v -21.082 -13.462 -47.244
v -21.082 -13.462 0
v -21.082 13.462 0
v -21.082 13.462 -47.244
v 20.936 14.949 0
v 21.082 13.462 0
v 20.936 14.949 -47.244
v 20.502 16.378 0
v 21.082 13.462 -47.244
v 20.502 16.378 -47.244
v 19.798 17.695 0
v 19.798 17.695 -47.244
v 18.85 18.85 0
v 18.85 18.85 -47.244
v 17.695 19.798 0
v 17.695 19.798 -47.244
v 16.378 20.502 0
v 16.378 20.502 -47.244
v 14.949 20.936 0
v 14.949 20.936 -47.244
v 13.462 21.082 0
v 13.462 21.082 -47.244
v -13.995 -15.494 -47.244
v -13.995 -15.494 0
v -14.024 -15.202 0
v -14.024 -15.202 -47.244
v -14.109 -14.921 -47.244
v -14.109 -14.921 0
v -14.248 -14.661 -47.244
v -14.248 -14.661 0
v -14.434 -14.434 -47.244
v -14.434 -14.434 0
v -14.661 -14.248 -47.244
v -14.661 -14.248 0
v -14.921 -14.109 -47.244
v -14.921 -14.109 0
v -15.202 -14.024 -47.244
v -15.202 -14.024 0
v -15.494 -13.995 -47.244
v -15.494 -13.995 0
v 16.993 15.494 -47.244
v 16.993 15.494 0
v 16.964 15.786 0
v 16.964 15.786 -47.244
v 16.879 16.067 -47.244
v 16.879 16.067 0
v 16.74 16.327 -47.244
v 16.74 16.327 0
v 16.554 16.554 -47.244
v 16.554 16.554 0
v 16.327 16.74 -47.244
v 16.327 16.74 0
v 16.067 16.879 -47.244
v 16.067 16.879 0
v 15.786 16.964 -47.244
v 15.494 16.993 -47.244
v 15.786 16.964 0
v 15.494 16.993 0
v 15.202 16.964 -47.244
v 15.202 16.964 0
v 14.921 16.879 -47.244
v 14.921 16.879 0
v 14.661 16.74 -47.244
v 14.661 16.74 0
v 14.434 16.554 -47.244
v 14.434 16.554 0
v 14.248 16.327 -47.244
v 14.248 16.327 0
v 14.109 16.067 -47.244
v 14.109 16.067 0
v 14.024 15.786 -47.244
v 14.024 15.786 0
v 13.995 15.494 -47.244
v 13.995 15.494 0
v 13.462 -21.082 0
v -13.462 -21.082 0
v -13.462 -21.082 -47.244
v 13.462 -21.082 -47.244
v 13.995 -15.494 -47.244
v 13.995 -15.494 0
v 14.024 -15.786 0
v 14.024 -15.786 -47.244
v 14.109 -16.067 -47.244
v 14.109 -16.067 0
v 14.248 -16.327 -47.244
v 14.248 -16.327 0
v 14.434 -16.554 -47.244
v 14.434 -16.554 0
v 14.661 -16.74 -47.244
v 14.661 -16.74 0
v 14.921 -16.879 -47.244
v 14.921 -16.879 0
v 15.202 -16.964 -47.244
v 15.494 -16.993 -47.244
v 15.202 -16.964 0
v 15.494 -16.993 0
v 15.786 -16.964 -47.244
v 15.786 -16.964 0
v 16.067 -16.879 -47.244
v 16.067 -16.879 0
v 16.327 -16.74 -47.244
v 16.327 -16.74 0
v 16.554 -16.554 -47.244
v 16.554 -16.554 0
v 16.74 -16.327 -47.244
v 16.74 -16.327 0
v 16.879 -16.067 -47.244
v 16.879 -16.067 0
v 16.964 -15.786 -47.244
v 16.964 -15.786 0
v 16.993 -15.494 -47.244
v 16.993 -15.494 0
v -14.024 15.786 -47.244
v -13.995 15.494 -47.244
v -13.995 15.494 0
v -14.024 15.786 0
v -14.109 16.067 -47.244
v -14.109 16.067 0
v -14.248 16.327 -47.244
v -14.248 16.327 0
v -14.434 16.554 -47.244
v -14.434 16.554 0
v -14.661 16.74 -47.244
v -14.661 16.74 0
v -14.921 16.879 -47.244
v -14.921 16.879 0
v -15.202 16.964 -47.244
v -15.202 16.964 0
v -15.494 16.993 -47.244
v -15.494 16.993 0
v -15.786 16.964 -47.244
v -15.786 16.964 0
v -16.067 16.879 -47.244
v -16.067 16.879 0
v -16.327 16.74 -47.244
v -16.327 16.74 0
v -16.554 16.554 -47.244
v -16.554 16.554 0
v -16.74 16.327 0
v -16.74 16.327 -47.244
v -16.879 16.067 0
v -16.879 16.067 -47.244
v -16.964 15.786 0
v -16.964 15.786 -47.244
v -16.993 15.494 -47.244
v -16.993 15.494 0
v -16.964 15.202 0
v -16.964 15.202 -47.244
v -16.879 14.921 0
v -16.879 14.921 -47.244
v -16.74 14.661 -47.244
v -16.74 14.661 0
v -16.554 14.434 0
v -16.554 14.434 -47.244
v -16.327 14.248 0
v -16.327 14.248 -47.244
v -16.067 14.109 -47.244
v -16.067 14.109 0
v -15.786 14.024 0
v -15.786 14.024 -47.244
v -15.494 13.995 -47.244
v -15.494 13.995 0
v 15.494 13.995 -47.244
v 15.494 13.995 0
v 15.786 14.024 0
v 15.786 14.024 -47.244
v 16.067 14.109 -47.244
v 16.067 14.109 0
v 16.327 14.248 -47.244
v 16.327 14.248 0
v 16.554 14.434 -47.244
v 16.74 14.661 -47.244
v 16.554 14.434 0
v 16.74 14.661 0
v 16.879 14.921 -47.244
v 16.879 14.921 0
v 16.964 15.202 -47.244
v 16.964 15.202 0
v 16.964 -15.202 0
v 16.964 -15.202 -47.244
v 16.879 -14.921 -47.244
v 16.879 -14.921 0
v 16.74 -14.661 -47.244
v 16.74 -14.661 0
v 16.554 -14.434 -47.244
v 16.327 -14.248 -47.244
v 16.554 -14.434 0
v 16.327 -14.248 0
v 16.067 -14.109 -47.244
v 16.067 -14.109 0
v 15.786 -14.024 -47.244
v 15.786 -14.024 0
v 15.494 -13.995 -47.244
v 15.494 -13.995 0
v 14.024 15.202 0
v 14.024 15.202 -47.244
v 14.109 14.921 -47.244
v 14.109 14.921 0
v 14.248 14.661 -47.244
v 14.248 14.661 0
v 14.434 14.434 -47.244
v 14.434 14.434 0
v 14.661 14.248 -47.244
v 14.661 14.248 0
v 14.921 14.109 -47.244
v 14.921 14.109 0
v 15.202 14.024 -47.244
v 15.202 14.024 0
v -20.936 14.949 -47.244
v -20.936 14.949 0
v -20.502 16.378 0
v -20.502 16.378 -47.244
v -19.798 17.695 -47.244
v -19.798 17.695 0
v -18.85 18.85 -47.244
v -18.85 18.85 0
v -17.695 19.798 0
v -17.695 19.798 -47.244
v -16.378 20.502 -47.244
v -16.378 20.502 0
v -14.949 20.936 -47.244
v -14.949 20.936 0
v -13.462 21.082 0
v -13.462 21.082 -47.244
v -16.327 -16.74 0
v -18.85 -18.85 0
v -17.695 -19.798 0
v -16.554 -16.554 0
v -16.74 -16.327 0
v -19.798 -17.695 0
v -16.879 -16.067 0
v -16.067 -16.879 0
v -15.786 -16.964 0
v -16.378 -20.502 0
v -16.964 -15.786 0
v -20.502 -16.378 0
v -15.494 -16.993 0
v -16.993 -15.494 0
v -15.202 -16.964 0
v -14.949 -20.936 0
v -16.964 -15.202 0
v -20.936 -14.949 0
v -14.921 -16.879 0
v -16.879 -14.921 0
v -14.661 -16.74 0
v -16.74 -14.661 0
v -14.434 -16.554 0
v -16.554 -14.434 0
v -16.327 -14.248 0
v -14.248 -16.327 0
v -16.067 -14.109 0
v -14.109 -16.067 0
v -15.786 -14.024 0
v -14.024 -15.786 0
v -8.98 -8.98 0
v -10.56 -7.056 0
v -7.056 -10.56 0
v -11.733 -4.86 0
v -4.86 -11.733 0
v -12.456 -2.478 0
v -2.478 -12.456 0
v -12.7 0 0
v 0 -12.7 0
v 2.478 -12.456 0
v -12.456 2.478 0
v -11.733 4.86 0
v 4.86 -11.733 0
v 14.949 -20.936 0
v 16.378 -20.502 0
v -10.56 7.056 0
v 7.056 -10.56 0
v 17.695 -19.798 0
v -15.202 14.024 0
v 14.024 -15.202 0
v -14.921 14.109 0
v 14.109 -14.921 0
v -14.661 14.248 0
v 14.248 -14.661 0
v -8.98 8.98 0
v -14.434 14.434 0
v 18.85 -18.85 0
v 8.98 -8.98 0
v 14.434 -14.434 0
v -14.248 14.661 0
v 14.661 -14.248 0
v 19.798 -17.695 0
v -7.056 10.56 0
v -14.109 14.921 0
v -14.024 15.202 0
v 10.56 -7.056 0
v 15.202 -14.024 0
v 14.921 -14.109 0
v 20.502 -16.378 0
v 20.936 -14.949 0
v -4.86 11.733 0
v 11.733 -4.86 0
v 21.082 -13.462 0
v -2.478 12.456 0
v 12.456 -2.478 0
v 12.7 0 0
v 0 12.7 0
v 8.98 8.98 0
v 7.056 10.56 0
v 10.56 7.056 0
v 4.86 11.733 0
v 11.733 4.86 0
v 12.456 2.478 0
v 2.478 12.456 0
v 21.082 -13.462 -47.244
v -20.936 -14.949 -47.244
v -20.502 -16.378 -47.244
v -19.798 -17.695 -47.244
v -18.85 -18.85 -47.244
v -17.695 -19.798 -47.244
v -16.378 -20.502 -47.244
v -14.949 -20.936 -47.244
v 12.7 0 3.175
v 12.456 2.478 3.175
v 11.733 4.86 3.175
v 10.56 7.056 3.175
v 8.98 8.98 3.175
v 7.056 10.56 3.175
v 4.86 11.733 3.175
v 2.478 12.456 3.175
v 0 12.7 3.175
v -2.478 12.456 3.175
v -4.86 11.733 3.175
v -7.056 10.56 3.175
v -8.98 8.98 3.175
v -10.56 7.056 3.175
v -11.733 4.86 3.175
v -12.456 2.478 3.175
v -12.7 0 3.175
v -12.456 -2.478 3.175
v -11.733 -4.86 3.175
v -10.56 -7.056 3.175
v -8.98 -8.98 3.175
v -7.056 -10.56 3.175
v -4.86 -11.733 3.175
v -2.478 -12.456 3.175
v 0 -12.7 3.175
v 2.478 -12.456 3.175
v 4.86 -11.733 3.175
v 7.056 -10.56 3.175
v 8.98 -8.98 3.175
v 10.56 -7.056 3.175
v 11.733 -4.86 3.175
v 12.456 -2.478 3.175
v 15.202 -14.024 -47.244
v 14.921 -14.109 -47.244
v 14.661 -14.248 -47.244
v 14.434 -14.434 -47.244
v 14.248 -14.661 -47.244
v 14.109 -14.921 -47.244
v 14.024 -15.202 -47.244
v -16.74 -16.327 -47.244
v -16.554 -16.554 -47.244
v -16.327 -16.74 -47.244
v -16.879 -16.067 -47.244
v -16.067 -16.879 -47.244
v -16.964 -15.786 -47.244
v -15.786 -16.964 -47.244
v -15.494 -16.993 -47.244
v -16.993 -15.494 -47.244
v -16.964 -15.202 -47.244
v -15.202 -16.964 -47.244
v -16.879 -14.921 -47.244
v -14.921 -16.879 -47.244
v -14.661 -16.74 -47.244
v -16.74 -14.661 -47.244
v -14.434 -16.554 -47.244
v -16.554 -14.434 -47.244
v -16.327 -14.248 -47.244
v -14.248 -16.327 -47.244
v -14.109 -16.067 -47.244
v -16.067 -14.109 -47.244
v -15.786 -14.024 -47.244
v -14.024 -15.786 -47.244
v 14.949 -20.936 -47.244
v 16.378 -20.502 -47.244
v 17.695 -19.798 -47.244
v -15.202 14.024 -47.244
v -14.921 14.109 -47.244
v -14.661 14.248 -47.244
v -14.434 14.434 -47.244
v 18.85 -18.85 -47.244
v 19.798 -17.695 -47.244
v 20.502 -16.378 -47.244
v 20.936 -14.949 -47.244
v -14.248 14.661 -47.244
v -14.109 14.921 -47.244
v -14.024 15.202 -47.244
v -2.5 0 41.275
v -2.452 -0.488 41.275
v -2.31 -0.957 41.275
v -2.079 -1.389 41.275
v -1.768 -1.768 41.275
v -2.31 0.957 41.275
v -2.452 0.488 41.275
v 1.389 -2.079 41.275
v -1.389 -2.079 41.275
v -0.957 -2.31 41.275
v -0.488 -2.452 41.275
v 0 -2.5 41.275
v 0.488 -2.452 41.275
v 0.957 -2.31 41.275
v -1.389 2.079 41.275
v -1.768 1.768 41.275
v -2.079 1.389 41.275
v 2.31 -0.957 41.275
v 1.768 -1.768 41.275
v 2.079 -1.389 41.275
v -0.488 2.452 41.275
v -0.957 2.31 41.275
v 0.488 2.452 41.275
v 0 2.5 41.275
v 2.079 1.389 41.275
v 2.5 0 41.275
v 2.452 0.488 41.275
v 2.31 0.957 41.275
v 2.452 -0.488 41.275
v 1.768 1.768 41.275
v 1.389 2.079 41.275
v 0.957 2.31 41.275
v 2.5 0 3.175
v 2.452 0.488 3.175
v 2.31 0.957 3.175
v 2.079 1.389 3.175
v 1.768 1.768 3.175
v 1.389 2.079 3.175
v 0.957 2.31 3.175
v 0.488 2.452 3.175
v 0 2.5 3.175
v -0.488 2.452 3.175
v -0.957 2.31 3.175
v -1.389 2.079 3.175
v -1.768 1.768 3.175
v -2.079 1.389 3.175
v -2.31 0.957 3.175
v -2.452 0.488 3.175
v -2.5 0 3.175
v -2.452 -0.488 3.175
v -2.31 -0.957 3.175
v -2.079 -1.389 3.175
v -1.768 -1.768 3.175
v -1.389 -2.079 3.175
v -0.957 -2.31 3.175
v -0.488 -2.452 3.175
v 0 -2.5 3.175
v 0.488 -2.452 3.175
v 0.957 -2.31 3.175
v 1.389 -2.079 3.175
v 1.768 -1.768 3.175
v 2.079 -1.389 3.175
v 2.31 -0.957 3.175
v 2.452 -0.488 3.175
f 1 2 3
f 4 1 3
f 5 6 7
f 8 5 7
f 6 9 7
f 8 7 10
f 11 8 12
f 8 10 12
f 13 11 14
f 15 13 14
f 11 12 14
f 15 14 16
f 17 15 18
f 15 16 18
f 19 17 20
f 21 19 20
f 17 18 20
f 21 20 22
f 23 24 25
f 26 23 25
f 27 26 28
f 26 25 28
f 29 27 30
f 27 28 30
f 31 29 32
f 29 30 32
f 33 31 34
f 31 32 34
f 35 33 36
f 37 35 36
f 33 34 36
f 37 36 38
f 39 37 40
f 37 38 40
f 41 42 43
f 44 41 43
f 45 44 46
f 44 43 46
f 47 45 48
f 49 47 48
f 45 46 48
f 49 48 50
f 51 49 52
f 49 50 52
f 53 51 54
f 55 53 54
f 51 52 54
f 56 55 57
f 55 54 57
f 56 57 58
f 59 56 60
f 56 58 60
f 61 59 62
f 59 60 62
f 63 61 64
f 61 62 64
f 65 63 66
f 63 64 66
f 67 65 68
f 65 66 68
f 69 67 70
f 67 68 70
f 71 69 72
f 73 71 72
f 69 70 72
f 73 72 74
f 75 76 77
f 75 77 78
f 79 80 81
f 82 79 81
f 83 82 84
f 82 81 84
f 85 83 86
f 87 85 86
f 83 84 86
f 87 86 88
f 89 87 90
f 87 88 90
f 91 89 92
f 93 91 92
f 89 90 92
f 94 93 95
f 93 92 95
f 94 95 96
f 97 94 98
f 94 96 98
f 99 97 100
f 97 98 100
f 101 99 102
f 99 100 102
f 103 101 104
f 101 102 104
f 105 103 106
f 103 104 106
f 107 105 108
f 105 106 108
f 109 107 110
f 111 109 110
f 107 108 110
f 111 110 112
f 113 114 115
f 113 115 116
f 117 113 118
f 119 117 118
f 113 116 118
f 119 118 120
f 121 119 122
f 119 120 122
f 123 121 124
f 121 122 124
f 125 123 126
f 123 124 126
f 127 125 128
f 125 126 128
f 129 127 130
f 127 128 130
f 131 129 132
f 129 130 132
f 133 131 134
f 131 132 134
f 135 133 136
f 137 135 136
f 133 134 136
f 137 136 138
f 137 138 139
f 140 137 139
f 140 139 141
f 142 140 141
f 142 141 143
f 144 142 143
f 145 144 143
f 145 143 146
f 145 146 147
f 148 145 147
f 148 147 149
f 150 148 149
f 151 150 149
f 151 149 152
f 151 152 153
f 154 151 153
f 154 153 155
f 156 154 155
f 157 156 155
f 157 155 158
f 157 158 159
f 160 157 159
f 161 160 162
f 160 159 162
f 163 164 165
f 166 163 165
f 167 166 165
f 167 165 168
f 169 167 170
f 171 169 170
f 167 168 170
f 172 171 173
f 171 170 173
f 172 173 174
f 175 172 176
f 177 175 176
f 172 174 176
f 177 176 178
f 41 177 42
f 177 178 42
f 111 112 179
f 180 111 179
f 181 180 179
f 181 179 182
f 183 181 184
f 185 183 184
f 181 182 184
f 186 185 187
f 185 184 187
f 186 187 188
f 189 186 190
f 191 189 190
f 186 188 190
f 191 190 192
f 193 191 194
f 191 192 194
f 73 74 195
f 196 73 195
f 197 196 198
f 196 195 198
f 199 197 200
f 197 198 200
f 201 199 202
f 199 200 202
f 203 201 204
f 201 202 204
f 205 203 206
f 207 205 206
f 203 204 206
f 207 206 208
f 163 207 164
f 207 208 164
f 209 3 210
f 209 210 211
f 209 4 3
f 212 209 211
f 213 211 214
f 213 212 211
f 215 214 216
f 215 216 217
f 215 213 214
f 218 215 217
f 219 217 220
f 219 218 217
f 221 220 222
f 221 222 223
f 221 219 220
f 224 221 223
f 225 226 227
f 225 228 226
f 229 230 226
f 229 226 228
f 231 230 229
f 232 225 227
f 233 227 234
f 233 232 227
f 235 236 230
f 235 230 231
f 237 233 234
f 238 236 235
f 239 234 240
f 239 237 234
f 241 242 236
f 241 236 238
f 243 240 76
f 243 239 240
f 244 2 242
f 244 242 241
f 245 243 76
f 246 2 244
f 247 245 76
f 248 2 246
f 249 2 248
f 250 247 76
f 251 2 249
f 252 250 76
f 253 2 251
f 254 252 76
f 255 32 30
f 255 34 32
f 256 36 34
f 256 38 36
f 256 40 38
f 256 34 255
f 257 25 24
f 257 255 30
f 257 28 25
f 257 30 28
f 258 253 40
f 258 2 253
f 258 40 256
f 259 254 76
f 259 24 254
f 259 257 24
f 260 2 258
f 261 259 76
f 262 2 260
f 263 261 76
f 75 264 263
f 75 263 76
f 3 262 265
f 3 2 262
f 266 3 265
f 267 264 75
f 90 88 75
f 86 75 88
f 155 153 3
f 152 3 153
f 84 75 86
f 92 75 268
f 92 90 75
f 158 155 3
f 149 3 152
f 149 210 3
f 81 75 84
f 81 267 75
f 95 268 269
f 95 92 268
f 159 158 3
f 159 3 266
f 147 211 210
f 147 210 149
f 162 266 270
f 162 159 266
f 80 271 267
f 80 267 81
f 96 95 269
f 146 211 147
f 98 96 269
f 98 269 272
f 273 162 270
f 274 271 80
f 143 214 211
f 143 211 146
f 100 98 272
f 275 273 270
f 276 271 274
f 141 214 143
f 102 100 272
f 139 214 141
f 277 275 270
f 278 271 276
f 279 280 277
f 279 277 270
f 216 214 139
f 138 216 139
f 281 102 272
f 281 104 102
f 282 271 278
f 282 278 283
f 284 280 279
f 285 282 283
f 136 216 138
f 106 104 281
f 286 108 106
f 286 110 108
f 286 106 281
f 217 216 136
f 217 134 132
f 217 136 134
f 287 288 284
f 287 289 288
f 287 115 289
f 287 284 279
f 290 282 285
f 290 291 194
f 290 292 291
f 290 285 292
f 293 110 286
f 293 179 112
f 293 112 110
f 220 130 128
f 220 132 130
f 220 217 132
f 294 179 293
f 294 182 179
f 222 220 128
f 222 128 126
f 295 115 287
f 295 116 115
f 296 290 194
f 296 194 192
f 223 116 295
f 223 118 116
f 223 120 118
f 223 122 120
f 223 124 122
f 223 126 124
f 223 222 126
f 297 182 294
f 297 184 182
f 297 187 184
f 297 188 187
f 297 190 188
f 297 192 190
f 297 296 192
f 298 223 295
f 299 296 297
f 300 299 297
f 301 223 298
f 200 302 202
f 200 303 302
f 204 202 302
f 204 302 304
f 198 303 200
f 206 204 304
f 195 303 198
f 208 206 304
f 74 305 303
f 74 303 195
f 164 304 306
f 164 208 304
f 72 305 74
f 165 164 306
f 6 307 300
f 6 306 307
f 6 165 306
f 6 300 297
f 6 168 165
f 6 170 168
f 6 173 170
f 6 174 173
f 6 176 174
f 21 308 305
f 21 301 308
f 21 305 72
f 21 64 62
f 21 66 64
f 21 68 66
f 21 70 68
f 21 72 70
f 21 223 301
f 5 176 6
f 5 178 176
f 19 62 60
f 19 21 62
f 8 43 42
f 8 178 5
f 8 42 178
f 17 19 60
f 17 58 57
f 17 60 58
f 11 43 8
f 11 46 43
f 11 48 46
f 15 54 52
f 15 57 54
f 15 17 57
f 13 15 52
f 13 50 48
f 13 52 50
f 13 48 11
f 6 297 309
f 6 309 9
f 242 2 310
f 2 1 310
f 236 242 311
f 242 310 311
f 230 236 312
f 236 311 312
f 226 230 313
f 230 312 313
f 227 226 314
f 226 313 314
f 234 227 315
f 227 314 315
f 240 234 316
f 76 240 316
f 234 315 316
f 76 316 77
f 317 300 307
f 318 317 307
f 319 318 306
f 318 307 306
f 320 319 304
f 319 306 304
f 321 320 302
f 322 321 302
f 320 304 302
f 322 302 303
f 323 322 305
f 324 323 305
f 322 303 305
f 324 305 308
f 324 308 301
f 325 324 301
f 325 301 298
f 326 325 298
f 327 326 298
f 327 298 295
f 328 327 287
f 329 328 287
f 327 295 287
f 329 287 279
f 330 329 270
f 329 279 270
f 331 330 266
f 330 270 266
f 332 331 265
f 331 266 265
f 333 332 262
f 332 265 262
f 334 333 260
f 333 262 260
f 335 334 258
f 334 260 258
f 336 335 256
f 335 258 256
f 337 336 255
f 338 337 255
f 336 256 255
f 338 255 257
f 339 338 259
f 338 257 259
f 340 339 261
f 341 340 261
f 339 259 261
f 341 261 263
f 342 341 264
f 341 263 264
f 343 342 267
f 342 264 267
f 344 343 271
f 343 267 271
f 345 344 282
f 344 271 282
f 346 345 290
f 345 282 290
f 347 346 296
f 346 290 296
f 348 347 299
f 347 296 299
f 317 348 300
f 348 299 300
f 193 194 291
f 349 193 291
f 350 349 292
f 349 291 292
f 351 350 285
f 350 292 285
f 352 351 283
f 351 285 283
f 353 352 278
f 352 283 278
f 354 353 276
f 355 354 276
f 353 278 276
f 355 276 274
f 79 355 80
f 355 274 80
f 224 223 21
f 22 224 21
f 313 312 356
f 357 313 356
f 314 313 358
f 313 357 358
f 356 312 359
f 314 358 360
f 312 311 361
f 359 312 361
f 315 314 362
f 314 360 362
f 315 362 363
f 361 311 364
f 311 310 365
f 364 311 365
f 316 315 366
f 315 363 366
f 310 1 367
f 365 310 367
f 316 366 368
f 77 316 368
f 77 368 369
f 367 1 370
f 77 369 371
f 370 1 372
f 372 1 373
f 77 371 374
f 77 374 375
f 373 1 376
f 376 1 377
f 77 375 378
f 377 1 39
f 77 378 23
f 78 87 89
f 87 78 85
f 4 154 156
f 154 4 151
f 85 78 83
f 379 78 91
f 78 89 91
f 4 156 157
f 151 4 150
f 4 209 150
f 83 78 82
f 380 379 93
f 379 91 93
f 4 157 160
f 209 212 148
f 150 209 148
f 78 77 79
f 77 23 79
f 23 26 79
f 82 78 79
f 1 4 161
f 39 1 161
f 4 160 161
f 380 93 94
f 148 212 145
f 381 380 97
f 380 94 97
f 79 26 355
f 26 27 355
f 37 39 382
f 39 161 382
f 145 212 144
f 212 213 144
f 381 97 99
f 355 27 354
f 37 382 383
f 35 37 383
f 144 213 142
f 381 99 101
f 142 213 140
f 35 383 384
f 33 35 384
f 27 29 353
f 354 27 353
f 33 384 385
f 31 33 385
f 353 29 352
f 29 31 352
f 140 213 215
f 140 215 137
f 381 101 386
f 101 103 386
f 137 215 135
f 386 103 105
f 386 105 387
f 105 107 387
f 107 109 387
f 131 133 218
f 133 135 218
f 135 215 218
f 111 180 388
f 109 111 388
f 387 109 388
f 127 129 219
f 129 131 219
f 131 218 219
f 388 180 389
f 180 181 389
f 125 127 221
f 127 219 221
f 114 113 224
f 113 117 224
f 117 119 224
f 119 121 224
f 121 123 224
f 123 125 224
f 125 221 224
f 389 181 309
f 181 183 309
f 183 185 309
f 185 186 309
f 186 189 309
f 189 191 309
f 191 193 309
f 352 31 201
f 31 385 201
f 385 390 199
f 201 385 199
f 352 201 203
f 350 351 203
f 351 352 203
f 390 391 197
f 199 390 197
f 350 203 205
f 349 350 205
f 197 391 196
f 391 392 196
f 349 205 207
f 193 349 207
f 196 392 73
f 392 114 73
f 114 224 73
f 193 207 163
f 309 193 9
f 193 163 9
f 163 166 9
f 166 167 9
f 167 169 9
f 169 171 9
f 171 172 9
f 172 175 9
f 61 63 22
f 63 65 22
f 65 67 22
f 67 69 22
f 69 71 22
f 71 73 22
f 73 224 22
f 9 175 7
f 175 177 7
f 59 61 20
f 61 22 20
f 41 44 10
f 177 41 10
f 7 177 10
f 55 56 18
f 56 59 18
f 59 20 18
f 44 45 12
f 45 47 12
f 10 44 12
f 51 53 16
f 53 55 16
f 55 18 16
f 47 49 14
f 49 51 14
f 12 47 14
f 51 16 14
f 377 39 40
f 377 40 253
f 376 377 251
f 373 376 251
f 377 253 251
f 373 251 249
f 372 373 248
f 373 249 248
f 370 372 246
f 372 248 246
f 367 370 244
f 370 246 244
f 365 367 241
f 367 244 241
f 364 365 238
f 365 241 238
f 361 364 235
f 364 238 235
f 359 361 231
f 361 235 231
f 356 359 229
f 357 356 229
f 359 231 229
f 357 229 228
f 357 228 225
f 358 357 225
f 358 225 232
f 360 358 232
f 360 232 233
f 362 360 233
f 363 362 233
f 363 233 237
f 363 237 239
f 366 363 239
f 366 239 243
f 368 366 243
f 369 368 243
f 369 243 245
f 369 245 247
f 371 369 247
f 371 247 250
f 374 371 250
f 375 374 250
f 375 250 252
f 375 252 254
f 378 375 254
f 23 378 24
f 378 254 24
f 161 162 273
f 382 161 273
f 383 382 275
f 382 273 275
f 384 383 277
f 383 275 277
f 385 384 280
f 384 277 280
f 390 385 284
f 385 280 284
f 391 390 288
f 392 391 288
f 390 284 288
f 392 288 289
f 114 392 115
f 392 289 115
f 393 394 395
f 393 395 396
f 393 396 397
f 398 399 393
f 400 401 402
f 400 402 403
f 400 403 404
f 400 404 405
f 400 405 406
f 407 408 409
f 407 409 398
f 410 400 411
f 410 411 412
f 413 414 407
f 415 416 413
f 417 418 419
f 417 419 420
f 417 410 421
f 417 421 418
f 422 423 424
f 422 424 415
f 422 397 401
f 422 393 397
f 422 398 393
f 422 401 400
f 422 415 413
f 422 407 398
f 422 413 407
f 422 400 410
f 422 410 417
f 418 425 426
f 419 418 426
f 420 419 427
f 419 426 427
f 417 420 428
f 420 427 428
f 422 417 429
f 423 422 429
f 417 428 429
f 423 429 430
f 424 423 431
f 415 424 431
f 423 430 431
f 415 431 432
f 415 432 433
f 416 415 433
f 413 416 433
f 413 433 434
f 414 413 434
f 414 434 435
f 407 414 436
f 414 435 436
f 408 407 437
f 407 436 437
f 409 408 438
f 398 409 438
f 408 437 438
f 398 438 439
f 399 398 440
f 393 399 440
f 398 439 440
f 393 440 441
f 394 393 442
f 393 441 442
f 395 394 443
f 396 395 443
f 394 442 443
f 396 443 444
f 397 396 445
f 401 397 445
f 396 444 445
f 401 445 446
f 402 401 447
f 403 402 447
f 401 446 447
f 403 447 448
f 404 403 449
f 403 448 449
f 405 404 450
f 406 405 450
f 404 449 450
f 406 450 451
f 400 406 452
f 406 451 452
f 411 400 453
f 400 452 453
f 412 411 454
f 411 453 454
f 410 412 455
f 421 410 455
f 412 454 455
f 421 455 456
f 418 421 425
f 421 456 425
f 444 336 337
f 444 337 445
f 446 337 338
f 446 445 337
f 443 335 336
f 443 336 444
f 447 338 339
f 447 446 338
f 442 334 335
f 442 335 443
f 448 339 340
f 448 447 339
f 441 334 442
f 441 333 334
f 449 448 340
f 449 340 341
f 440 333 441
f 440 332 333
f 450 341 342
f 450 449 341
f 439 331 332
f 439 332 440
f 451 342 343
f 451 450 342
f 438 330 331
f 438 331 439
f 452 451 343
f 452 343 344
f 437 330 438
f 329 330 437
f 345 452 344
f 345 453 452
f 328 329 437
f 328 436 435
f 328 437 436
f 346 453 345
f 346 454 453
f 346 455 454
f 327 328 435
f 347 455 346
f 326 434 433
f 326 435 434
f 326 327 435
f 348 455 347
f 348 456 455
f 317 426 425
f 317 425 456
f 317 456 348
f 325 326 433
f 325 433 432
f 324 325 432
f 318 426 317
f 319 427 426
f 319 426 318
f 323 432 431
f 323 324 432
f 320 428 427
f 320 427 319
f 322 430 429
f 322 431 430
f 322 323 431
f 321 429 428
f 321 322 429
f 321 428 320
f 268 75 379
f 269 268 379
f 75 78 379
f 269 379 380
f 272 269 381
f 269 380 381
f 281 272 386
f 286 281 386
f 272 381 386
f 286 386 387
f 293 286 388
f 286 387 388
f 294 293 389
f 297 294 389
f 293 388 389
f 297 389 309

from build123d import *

# Parameters (mm, degrees)
F0_W     = 42.164
F0_H     = 42.164
F1_DEPTH = 47.244
F2_R     = 7.62
F3_R     = 12.7
F4_DEPTH = 3.175
F5_R     = 2.499995
F6_DEPTH = 38.1
F8_DEPTH = 47.245


with BuildPart() as f1:
    # F0 (on Top) → F1 (new body)
    with BuildSketch(Plane.XY):
        Rectangle(F0_W, F0_H)
    extrude(amount=-F1_DEPTH)

    # F2
    f2_edges = [f1.edges().sort_by_distance(p)[0] for p in [
        (21.082, -21.082, -23.622),
        (21.082, 21.082, -23.622),
        (-21.082, 21.082, -23.622),
        (-21.082, -21.082, -23.622),
    ]]
    fillet(f2_edges, radius=F2_R)

    # F3 (on face) → F4 (join)
    with BuildSketch(Plane.XY):
        Circle(F3_R)
    extrude(amount=F4_DEPTH)

    # F5 (on face) → F6 (join)
    with BuildSketch(Plane.XY.offset(3.175)):
        Circle(F5_R)
    extrude(amount=F6_DEPTH)

    # F7 (on face) → F8 (cut, through all)
    with BuildSketch(Plane.XY):
        with BuildLine():
            Line((-15.494, 15.494), (-13.9954, 15.494))
            ThreePointArc((-13.9954, 15.494), (-16.55367, 16.55367), (-15.494, 13.9954))
            Line((-15.494, 13.9954), (-15.494, 15.494))
        make_face()
        with BuildLine():
            ThreePointArc((-15.494, 13.9954), (-14.43433, 14.43433), (-13.9954, 15.494))
            Line((-13.9954, 15.494), (-15.494, 15.494))
            Line((-15.494, 15.494), (-15.494, 13.9954))
        make_face()
        with BuildLine():
            Line((15.494, 15.494), (13.9954, 15.494))
            ThreePointArc((13.9954, 15.494), (14.43433, 14.43433), (15.494, 13.9954))
            Line((15.494, 13.9954), (15.494, 15.494))
        make_face()
        with BuildLine():
            ThreePointArc((16.9926, 15.494), (15.494, 16.9926), (13.9954, 15.494))
            Line((13.9954, 15.494), (15.494, 15.494))
            Line((15.494, 15.494), (15.494, 13.9954))
            ThreePointArc((15.494, 13.9954), (16.55367, 14.43433), (16.9926, 15.494))
        make_face()
        with BuildLine():
            ThreePointArc((16.9926, -15.494), (16.55367, -14.43433), (15.494, -13.9954))
            Line((15.494, -13.9954), (15.494, -15.494))
            Line((15.494, -15.494), (13.9954, -15.494))
            ThreePointArc((13.9954, -15.494), (15.494, -16.9926), (16.9926, -15.494))
        make_face()
        with BuildLine():
            Line((15.494, -15.494), (15.494, -13.9954))
            ThreePointArc((15.494, -13.9954), (14.43433, -14.43433), (13.9954, -15.494))
            Line((13.9954, -15.494), (15.494, -15.494))
        make_face()
        with BuildLine():
            Line((-15.494, -15.494), (-15.494, -13.9954))
            ThreePointArc((-15.494, -13.9954), (-16.55367, -16.55367), (-13.9954, -15.494))
            Line((-13.9954, -15.494), (-15.494, -15.494))
        make_face()
        with BuildLine():
            ThreePointArc((-13.9954, -15.494), (-14.43433, -14.43433), (-15.494, -13.9954))
            Line((-15.494, -13.9954), (-15.494, -15.494))
            Line((-15.494, -15.494), (-13.9954, -15.494))
        make_face()
    extrude(amount=-F8_DEPTH, mode=Mode.SUBTRACT)


solid = f1.part
